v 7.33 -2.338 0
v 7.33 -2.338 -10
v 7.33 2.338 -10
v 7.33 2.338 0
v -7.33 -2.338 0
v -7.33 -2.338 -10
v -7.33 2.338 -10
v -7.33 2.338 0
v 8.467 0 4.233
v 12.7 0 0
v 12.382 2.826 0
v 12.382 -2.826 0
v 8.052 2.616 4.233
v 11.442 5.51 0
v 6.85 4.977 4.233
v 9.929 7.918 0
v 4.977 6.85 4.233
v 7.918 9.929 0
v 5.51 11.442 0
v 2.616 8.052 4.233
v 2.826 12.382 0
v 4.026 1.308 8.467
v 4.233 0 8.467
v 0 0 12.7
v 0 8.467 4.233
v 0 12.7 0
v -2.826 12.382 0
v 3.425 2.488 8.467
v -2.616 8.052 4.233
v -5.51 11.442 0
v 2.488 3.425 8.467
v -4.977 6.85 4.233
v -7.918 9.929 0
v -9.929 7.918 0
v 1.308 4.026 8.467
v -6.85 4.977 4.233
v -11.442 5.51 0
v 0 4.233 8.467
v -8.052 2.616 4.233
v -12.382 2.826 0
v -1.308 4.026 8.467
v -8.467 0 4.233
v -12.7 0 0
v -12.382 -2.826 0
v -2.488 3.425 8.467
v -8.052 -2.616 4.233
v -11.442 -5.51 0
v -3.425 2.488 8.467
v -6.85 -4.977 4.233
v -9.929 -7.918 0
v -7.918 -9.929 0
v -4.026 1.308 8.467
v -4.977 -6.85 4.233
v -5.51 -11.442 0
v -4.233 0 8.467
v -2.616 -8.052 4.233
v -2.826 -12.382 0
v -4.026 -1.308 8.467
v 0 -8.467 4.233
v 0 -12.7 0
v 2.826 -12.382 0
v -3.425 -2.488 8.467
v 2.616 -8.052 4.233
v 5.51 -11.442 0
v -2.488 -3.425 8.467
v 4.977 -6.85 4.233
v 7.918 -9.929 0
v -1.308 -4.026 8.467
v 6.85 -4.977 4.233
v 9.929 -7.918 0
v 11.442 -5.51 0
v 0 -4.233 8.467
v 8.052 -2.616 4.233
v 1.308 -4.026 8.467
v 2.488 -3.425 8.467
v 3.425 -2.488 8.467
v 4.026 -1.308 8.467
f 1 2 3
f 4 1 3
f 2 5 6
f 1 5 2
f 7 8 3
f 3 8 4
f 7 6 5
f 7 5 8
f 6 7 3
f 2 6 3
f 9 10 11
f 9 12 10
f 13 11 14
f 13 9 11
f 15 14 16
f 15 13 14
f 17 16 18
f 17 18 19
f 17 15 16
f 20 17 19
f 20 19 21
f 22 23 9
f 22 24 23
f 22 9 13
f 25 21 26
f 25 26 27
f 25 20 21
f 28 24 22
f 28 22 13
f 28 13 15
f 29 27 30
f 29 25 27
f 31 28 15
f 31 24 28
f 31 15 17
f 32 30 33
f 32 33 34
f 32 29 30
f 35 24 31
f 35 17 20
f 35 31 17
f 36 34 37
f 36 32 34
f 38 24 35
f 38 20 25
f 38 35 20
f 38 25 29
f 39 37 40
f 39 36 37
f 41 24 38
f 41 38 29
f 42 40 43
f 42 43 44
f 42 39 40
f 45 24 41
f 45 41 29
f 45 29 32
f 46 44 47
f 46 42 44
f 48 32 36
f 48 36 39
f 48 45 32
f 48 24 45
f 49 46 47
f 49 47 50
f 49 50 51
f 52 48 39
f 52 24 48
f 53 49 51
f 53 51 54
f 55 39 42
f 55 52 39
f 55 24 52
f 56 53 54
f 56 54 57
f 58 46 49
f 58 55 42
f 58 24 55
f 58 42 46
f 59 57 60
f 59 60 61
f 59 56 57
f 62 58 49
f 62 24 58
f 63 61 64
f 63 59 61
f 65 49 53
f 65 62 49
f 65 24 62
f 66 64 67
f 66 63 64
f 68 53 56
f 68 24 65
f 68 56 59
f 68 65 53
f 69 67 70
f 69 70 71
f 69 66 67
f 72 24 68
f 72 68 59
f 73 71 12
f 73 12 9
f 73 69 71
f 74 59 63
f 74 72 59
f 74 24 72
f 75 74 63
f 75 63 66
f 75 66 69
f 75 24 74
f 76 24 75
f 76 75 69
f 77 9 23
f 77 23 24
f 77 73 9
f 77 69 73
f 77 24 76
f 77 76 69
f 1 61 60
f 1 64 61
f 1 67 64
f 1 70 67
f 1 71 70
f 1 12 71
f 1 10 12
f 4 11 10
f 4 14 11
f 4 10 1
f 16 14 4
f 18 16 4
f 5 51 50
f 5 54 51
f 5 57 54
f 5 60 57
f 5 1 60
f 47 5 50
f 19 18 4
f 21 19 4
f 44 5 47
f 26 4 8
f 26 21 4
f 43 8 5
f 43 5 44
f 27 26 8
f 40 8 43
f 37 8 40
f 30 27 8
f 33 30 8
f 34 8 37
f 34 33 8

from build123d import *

# Parameters (mm, degrees)
F3_W     = 14.659638
F3_H     = 4.675124
F4_DEPTH = 10


with BuildPart() as f2:
    # F0 (on Front) → F2 (revolve)
    with BuildSketch(Plane.XZ):
        Polygon((0, 12.7), (0, 0), (12.7, 0), align=None)
    revolve(axis=Axis((0, 0, 19.931149), (0, 0, 1)))

    # F3 (on Top) → F4 (join)
    with BuildSketch(Plane.XY):
        Rectangle(F3_W, F3_H)
    extrude(amount=-F4_DEPTH)


solid = f2.part
